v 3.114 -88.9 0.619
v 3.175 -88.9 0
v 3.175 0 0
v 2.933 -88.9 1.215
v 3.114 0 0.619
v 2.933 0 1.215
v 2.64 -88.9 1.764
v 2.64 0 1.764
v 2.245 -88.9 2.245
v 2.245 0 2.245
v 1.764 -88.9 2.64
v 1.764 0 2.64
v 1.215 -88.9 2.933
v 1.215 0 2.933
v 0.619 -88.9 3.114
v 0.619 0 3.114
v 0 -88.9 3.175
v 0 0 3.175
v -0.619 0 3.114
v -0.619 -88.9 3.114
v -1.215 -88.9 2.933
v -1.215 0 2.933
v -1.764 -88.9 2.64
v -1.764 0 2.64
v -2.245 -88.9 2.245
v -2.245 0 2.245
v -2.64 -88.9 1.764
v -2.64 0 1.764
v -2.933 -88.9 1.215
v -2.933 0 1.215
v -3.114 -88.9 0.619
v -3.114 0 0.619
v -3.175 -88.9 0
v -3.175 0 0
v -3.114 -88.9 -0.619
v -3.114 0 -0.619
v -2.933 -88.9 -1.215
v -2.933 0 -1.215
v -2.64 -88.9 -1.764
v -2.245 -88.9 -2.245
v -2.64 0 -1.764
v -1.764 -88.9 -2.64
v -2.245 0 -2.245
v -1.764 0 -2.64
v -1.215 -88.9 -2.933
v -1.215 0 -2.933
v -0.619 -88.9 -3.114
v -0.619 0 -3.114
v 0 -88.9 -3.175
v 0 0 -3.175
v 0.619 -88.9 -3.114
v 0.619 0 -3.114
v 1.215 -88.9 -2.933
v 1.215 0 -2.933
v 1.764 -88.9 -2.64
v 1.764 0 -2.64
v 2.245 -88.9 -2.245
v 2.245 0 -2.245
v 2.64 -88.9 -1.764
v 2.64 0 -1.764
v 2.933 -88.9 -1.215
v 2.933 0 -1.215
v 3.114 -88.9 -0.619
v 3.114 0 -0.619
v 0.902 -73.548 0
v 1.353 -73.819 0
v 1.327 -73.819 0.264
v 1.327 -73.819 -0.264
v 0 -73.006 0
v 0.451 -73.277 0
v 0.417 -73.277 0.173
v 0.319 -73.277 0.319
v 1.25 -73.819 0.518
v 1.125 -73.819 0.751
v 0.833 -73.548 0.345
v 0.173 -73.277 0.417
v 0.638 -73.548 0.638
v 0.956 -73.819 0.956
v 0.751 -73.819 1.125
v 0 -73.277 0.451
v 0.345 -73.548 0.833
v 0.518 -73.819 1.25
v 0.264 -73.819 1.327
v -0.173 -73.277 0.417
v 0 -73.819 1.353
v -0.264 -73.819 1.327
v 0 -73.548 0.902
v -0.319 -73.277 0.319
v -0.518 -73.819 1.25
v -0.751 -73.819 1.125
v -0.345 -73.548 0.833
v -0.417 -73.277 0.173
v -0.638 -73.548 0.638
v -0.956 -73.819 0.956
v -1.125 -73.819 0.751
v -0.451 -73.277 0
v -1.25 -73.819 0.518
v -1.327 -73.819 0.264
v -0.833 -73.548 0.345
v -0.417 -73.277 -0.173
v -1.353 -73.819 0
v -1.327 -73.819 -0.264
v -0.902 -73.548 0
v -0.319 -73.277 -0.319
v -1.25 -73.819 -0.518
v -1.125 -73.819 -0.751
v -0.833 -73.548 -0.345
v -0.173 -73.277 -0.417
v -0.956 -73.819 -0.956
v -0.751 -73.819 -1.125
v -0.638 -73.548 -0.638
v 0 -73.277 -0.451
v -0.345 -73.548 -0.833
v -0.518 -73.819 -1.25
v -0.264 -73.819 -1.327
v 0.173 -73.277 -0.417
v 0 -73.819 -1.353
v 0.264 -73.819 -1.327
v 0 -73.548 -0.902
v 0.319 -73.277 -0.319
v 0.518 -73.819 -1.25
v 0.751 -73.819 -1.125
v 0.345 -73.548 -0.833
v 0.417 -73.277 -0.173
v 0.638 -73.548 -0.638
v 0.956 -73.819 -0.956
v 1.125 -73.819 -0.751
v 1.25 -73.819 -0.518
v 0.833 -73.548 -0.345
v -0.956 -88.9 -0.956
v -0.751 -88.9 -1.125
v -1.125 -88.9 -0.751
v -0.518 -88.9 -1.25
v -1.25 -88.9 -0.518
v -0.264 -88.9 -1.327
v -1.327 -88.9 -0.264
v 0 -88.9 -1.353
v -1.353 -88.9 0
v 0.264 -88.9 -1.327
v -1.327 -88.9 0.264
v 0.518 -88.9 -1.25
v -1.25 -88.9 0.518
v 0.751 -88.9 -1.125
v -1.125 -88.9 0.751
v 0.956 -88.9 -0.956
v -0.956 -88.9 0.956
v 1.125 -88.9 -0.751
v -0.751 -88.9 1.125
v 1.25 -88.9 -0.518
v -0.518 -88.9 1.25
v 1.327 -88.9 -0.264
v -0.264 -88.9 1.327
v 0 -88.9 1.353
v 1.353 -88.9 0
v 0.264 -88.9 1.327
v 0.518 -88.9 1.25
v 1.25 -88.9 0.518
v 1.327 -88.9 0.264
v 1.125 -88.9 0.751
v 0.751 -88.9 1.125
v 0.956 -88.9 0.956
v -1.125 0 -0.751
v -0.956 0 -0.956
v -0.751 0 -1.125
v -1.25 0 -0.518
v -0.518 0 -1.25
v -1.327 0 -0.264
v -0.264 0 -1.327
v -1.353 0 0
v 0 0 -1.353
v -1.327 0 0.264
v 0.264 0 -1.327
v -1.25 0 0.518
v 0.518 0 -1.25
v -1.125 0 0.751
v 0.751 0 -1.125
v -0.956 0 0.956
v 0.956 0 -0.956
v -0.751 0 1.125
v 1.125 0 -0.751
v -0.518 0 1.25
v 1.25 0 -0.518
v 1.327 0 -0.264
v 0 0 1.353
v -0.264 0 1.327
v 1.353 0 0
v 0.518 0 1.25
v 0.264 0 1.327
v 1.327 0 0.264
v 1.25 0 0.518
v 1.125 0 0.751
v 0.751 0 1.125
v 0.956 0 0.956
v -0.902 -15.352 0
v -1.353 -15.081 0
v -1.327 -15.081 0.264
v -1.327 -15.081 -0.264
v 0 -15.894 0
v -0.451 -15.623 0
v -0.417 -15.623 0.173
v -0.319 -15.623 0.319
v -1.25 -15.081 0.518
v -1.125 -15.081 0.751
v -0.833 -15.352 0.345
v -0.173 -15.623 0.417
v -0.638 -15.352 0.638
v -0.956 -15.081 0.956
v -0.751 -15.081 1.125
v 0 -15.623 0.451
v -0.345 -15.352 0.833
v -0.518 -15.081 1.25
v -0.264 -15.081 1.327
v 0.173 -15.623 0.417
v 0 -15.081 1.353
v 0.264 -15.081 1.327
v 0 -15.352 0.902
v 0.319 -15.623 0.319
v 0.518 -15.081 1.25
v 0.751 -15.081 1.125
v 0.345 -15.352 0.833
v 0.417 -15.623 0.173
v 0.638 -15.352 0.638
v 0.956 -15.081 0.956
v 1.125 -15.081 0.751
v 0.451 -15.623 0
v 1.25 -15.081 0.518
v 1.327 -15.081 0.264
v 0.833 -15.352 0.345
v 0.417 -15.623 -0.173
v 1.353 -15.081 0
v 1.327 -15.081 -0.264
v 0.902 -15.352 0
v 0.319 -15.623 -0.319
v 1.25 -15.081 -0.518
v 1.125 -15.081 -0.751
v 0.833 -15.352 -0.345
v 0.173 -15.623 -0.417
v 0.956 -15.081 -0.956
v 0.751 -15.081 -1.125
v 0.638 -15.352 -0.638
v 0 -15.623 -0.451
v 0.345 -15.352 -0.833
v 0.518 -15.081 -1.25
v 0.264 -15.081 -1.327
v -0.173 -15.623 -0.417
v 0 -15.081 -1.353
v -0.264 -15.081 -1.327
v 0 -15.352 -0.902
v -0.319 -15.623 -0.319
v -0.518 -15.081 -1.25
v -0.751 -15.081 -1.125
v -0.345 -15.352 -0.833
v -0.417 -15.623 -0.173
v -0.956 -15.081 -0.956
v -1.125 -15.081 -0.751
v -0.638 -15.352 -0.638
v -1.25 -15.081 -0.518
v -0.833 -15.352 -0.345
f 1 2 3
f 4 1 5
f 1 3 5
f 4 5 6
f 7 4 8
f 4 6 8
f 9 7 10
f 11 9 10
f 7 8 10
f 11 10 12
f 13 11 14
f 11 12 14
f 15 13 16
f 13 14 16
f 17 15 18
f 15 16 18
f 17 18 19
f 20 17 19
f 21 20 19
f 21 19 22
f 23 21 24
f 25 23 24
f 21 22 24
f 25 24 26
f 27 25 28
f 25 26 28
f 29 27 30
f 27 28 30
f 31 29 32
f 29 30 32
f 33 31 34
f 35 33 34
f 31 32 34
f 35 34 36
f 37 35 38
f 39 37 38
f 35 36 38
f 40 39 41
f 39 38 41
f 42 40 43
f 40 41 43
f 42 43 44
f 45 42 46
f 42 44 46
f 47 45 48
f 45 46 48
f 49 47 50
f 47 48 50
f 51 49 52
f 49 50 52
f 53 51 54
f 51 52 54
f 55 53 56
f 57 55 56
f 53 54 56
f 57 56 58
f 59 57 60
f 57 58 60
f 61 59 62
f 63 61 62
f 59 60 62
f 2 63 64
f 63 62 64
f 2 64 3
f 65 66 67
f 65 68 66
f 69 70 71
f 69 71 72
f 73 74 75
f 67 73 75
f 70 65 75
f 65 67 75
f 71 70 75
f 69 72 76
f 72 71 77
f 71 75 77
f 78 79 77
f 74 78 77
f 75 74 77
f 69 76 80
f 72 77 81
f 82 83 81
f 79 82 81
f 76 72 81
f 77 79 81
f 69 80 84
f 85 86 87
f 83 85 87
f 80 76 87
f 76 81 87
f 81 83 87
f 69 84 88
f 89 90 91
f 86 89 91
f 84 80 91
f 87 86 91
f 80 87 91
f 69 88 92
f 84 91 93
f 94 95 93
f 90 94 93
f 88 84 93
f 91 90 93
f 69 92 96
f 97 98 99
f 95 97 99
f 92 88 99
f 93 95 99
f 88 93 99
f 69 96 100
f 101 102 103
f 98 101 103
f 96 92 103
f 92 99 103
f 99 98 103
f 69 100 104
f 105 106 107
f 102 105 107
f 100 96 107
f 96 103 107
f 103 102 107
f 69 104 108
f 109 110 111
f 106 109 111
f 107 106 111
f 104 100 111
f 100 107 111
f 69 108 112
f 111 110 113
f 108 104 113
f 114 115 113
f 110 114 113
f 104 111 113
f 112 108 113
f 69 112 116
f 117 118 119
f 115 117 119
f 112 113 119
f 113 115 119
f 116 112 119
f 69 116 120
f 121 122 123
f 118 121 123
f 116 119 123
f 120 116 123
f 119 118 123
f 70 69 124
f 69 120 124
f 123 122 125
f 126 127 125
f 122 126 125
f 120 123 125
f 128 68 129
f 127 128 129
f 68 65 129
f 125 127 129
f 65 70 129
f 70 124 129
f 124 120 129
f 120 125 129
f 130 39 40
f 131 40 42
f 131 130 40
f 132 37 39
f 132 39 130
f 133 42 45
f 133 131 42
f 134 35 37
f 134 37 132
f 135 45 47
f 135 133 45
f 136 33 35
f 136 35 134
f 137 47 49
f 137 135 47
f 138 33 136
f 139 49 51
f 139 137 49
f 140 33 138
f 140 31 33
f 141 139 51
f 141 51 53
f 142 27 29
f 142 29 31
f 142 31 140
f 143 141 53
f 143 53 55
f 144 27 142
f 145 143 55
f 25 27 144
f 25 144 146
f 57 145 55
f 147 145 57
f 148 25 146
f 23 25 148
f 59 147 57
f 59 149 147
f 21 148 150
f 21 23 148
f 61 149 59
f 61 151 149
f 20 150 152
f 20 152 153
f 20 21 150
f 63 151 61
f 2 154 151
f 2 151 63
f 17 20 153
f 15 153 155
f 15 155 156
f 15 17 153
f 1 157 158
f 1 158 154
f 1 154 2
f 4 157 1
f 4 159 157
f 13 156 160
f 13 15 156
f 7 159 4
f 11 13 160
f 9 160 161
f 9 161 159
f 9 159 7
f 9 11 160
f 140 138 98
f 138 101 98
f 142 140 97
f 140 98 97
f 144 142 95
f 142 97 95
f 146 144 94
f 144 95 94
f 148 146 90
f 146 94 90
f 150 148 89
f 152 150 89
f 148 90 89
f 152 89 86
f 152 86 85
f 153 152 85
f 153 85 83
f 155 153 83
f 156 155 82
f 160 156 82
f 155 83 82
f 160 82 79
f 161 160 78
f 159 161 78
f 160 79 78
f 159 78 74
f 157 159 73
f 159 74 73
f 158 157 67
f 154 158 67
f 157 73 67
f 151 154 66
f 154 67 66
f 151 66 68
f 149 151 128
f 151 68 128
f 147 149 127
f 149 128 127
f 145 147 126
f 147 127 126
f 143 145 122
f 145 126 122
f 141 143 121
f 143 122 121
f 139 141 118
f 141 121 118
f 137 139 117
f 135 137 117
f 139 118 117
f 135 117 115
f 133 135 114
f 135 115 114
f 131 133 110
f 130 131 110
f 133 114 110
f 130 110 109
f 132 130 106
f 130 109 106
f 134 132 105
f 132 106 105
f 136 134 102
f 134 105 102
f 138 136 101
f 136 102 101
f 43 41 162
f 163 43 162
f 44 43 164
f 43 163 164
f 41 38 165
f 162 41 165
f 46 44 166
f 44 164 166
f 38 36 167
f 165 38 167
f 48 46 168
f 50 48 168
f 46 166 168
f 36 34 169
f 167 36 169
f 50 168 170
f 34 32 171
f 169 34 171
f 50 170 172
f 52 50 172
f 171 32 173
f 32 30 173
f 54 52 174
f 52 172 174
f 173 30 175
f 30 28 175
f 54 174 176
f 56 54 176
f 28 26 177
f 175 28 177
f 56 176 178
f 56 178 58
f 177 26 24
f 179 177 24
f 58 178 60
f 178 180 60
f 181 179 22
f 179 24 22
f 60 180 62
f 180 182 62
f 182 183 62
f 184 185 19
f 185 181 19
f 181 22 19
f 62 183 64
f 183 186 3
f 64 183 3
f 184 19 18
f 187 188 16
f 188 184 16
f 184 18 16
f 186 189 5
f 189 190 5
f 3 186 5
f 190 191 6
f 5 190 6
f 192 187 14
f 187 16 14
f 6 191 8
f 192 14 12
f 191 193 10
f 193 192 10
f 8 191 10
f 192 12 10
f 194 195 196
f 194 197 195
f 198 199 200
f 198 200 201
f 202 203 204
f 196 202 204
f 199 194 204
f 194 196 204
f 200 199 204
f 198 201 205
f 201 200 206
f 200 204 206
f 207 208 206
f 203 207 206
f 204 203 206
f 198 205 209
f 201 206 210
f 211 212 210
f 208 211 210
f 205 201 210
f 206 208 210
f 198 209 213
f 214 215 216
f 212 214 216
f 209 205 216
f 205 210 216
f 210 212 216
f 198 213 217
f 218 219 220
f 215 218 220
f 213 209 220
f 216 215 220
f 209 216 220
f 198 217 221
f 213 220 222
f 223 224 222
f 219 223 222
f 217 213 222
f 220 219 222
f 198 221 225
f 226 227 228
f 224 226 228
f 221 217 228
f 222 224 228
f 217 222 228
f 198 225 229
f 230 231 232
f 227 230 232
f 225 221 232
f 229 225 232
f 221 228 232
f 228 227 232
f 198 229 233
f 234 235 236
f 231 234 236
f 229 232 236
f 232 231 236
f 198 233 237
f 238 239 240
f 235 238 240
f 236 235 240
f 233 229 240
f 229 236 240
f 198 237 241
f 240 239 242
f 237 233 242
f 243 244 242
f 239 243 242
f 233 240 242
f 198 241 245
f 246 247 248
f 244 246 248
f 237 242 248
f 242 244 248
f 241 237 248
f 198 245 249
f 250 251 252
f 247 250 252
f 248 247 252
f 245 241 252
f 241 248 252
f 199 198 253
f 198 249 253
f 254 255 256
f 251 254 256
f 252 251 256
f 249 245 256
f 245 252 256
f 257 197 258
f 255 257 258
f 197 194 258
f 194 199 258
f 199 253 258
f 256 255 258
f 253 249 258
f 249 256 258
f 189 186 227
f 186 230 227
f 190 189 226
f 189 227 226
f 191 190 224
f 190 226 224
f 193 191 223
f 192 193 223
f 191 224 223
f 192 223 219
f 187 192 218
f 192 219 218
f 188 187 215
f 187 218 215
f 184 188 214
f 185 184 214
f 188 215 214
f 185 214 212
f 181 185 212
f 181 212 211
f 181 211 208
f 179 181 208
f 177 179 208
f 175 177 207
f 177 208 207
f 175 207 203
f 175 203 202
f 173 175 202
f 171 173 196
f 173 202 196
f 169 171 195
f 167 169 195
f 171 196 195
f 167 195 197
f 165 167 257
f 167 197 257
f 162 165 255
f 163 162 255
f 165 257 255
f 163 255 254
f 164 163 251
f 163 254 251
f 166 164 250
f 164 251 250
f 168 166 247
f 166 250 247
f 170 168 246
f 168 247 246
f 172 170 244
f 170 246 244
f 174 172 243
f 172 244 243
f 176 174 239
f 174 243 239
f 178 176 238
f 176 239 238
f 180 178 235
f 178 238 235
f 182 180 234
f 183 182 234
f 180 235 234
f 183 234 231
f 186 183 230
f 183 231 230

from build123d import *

# Parameters (mm, degrees)
F0_R           = 3.175
F1_DEPTH       = 88.9
F4_D           = 2.7051
F4_DEPTH       = 15.08125
F4_TIP         = 0.8126940303
F4_ON_F2_D     = 2.7051
F4_ON_F2_DEPTH = 15.08125
F4_ON_F2_TIP   = 0.8126940303


with BuildPart() as f1:
    # F0 (on Front) → F1 (new body)
    with BuildSketch(Plane.XZ):
        Circle(F0_R)
    extrude(amount=F1_DEPTH)

    # F4
    with Locations(Plane(origin=(0, 0, 0), x_dir=(-1, 0, 0), z_dir=(0, 1, 0))):
        with Locations((0, 0)):
            Hole(F4_D / 2, depth=F4_DEPTH)
            with Locations((0, 0, -(F4_DEPTH + F4_TIP / 2))):  # 118° drill point
                Cone(0, F4_D / 2, F4_TIP, mode=Mode.SUBTRACT)

    # F4 on F2
    with Locations(Plane.XZ.offset(88.9)):
        with Locations((0, 0)):
            Hole(F4_ON_F2_D / 2, depth=F4_ON_F2_DEPTH)
            with Locations((0, 0, -(F4_ON_F2_DEPTH + F4_ON_F2_TIP / 2))):  # 118° drill point
                Cone(0, F4_ON_F2_D / 2, F4_ON_F2_TIP, mode=Mode.SUBTRACT)


solid = f1.part
